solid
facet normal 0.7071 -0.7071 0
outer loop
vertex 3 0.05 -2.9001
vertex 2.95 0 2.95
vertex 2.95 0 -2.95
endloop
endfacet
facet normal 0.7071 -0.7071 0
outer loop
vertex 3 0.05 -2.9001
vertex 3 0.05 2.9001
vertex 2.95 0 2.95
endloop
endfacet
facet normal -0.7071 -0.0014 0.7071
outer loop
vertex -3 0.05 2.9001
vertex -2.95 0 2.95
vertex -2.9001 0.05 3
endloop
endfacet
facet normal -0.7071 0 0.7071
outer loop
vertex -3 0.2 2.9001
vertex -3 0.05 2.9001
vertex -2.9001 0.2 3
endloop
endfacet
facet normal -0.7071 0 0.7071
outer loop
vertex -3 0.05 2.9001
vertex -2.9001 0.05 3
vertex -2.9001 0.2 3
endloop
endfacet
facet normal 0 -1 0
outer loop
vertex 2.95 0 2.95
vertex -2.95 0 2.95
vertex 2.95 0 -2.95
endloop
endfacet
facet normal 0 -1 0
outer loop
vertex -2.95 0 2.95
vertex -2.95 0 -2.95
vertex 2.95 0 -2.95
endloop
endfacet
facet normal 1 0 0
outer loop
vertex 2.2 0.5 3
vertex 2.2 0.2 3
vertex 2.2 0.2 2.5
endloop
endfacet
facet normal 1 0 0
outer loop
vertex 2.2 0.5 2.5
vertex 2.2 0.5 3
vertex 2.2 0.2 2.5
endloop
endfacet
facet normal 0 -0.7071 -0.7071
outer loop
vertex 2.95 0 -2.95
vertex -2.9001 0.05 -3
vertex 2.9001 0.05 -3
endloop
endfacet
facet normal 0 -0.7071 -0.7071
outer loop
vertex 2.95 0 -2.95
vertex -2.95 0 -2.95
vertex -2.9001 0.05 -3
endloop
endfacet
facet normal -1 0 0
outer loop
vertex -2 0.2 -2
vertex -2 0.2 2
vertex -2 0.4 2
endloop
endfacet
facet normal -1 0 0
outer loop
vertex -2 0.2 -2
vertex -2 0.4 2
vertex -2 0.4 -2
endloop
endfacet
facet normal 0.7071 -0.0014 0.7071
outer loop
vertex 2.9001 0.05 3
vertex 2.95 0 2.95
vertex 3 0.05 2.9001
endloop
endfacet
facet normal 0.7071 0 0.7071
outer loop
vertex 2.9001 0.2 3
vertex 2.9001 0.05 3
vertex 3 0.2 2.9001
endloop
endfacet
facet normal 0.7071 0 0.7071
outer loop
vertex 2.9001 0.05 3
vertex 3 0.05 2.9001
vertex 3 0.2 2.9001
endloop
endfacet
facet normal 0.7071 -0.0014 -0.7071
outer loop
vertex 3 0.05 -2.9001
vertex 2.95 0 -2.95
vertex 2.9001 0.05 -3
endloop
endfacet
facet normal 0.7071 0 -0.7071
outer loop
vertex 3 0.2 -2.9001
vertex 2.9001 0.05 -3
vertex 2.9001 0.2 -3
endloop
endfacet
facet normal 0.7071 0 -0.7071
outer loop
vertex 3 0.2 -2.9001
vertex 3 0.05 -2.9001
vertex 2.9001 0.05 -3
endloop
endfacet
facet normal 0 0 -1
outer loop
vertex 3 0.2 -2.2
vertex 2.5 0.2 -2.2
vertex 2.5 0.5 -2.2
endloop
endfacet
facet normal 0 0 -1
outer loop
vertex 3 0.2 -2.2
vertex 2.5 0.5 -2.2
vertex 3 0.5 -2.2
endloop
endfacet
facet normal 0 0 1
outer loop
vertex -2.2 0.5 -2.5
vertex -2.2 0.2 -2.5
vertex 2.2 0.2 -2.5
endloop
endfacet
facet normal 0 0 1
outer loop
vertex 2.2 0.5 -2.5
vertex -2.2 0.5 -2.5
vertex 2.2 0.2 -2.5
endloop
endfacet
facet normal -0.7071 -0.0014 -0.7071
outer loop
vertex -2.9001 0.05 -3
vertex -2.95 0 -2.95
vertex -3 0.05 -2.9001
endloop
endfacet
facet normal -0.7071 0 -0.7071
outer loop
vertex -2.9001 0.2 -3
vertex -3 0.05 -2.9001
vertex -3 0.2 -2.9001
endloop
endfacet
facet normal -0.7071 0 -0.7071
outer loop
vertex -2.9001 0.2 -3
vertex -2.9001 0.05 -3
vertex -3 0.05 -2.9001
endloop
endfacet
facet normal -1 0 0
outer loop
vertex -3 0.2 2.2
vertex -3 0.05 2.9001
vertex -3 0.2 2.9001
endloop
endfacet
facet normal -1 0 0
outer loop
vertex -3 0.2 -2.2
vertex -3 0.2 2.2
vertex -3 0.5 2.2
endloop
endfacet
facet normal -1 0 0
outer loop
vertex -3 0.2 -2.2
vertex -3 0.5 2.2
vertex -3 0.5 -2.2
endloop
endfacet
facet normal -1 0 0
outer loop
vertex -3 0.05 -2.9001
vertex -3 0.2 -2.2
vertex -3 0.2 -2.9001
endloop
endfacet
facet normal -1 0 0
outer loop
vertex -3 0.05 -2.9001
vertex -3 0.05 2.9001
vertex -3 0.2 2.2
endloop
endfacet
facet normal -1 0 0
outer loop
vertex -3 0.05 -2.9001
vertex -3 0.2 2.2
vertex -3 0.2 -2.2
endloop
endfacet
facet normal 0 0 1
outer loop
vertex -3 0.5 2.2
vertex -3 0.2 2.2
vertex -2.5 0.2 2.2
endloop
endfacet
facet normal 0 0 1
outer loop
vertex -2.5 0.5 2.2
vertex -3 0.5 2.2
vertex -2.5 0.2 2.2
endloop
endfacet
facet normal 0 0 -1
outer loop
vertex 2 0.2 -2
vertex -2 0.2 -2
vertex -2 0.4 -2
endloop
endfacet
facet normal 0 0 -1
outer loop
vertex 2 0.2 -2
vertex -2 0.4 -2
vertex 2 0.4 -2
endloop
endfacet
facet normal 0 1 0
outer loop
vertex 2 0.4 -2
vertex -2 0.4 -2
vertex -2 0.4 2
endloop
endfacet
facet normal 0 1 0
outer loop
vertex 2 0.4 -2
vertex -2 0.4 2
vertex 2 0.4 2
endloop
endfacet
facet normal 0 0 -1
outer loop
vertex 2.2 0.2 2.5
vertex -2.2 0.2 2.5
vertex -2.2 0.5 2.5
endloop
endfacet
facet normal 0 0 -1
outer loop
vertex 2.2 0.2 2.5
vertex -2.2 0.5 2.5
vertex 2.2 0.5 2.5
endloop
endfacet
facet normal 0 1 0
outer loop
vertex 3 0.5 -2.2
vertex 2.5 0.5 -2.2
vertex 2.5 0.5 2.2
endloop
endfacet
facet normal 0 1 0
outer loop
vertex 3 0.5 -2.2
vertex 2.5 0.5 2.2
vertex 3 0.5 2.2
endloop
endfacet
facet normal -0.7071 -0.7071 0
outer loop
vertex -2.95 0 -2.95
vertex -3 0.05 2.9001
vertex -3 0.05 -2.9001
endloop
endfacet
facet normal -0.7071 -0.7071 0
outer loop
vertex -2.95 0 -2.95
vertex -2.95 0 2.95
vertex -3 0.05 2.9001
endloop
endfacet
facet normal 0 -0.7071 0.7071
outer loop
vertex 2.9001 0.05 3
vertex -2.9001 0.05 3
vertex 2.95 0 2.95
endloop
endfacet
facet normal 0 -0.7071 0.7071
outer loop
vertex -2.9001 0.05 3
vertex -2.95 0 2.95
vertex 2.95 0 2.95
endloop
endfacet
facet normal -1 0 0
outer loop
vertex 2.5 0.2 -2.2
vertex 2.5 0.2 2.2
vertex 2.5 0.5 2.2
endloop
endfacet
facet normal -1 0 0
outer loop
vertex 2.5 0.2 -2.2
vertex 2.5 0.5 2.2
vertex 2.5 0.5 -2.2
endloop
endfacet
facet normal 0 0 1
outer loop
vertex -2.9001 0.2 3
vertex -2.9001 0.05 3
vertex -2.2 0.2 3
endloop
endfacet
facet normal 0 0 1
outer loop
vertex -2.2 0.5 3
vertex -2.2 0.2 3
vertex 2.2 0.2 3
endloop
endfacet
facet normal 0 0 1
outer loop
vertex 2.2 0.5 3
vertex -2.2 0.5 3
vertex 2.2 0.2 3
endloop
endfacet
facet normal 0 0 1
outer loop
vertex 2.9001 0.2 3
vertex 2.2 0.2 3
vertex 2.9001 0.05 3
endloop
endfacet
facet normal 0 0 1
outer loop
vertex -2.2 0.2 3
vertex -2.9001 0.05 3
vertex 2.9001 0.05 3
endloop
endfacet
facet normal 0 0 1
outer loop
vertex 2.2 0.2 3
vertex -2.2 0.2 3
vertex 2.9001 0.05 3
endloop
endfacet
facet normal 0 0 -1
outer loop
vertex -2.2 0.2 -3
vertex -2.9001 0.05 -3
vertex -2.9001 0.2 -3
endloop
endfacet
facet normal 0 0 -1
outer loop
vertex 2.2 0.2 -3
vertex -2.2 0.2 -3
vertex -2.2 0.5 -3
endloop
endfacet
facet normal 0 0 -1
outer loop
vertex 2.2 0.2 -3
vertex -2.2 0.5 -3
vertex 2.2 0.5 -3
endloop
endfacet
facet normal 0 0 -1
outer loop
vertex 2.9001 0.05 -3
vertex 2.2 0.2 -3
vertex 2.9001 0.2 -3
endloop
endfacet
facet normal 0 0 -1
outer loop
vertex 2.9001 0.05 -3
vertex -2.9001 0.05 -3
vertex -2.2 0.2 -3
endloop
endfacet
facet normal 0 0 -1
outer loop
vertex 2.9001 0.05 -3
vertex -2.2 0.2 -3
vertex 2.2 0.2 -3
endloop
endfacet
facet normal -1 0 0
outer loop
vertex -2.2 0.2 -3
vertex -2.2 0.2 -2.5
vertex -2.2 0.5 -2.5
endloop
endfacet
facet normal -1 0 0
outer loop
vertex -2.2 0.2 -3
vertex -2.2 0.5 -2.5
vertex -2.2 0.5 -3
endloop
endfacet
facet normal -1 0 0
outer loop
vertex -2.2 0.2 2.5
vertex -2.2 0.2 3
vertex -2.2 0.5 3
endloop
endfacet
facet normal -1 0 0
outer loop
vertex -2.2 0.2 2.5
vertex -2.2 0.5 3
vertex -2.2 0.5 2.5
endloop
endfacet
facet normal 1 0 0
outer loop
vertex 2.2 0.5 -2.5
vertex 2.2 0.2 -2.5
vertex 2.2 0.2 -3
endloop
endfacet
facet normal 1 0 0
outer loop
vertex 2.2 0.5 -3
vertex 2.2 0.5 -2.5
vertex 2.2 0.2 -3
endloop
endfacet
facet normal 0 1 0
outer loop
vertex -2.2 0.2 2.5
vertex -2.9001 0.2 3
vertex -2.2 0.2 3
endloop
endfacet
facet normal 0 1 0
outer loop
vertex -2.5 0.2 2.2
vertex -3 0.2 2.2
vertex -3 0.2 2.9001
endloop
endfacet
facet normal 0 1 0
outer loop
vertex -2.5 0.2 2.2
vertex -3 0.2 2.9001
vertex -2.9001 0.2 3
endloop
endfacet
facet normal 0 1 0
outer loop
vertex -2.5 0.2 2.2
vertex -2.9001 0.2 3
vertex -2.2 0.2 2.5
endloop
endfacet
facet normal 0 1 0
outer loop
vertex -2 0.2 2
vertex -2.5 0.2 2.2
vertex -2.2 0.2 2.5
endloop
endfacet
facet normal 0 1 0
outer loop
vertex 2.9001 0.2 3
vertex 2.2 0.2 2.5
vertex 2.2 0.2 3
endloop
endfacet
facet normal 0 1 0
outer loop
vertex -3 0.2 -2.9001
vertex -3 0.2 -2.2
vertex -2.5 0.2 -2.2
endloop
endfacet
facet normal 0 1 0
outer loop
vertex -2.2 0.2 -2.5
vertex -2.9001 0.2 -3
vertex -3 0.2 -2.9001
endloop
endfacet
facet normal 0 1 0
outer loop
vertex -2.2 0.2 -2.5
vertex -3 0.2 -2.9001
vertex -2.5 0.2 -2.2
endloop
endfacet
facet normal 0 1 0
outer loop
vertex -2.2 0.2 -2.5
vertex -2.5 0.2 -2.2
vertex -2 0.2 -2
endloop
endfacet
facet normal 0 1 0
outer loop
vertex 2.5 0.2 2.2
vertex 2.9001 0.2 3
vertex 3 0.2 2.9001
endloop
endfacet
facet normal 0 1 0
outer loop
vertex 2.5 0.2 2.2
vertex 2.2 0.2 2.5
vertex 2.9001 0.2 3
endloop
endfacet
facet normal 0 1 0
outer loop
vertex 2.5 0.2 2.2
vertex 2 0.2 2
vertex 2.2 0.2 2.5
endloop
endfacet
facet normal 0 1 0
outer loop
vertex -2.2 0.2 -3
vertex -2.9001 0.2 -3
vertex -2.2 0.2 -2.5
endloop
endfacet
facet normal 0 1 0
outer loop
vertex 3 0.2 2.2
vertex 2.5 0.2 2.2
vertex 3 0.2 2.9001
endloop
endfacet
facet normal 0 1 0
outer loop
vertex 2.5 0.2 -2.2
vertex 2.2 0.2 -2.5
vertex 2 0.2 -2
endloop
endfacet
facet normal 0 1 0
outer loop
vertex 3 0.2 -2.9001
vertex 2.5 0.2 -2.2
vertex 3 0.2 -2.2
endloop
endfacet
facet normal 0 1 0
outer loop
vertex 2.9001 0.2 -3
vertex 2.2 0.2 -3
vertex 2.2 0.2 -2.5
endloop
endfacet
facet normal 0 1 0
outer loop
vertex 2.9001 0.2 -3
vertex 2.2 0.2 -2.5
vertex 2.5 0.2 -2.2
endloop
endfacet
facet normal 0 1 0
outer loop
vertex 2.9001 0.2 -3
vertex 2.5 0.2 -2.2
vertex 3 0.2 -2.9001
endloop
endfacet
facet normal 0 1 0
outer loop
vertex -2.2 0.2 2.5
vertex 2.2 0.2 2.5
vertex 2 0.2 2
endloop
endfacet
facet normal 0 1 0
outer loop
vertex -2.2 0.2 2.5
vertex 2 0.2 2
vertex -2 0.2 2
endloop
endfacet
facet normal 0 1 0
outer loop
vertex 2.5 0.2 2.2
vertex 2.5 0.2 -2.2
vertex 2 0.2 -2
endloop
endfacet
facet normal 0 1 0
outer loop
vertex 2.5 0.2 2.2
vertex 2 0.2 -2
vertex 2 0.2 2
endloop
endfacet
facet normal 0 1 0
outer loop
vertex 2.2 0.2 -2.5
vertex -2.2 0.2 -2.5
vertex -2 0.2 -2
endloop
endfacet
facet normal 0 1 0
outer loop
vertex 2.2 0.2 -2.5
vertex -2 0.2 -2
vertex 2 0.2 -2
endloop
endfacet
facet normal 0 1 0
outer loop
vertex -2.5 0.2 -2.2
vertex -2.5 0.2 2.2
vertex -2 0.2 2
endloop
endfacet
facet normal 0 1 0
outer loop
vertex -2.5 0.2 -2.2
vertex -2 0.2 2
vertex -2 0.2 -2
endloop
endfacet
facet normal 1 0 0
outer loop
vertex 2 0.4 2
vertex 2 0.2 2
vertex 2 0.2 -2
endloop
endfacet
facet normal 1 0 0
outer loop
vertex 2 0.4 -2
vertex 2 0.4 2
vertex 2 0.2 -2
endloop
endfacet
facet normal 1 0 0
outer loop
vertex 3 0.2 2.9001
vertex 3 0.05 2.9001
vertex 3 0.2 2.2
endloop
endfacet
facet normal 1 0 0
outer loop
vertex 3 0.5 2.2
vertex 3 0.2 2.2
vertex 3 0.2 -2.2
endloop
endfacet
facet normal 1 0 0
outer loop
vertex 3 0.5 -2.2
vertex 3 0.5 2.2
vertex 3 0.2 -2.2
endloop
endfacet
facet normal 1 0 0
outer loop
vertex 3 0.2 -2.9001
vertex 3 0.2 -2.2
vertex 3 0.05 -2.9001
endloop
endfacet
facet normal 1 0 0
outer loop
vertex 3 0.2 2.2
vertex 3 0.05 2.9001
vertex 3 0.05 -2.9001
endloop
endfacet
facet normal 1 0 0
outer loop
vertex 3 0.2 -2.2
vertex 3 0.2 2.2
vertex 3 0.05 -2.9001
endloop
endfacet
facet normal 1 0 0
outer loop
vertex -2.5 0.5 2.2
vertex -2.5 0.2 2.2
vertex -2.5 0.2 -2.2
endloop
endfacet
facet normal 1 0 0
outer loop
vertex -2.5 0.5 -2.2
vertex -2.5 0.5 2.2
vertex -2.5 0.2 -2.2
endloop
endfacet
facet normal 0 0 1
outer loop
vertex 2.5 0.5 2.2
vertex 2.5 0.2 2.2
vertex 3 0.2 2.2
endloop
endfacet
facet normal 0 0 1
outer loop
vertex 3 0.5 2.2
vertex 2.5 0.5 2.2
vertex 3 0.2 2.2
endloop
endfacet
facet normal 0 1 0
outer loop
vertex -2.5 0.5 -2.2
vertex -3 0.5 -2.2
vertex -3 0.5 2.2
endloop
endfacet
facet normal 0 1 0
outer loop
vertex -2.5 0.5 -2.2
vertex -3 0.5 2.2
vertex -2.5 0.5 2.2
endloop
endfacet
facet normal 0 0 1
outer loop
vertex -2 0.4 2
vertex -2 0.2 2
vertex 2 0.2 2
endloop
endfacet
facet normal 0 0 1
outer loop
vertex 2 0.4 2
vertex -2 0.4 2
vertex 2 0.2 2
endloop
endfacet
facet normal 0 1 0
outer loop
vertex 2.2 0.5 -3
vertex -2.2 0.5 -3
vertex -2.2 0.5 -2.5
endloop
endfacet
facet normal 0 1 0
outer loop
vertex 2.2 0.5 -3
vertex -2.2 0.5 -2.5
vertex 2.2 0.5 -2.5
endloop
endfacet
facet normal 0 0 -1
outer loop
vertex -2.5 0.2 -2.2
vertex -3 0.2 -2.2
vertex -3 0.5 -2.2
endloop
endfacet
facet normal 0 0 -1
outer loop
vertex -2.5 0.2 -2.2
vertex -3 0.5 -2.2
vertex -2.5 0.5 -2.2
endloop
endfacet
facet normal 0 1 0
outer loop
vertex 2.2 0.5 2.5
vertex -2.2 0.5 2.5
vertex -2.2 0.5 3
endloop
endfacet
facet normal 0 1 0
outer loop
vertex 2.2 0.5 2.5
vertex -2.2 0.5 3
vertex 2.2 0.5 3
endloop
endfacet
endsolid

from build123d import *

# Parameters (mm, degrees)
SKETCH_1_W      = 6
SKETCH_1_H      = 6
EXTRUDE_1_DEPTH = 0.2
SKETCH_2_W      = 4
SKETCH_2_H      = 4
EXTRUDE_2_DEPTH = 0.2
SKETCH_3_W      = 0.5
SKETCH_3_H      = 4.4
SKETCH_3_W_2    = 4.4
SKETCH_3_H_2    = 0.5
EXTRUDE_3_DEPTH = 0.3
CHAMFER_1_SIZE  = 0.05
CHAMFER_2_SIZE  = 0.1


with BuildPart() as part:
    # 草图1 → 凸台-拉伸1 (new body)
    with BuildSketch(Plane(origin=(0, 0, 0), x_dir=(1, 0, 0), z_dir=(0, 1, 0))):
        Rectangle(SKETCH_1_W, SKETCH_1_H)
    extrude(amount=EXTRUDE_1_DEPTH)

    # 草图2 → 凸台-拉伸2 (add)
    with BuildSketch(Plane(origin=(0, 0.2, 0), x_dir=(1, 0, 0), z_dir=(0, 1, 0))):
        Rectangle(SKETCH_2_W, SKETCH_2_H)
    extrude(amount=EXTRUDE_2_DEPTH)

    # 草图3 → 凸台-拉伸3 (add)
    with BuildSketch(Plane(origin=(0, 0.2, 0), x_dir=(1, 0, 0), z_dir=(0, 1, 0))):
        with Locations((-2.75, 0)):
            Rectangle(SKETCH_3_W, SKETCH_3_H)
        with Locations((0, -2.75)):
            Rectangle(SKETCH_3_W_2, SKETCH_3_H_2)
        with Locations((2.75, 0)):
            Rectangle(SKETCH_3_W, SKETCH_3_H)
        with Locations((0, 2.75)):
            Rectangle(SKETCH_3_W_2, SKETCH_3_H_2)
    extrude(amount=EXTRUDE_3_DEPTH)

    # 倒角1
    chamfer_1_edges = [part.edges().sort_by_distance(p)[0] for p in [
        (0, 0, 3),
        (-3, 0, 0),
        (0, 0, -3),
        (3, 0, 0),
    ]]
    chamfer(chamfer_1_edges, length=CHAMFER_1_SIZE)

    # 倒角2
    chamfer_2_edges = [part.edges().sort_by_distance(p)[0] for p in [
        (3, 0.125, 3),
        (3, 0.125, -3),
        (-3, 0.125, -3),
        (-3, 0.125, 3),
    ]]
    chamfer(chamfer_2_edges, length=CHAMFER_2_SIZE - 0.0001)  # a hair under: the kernel refuses the full size


solid = part.part
